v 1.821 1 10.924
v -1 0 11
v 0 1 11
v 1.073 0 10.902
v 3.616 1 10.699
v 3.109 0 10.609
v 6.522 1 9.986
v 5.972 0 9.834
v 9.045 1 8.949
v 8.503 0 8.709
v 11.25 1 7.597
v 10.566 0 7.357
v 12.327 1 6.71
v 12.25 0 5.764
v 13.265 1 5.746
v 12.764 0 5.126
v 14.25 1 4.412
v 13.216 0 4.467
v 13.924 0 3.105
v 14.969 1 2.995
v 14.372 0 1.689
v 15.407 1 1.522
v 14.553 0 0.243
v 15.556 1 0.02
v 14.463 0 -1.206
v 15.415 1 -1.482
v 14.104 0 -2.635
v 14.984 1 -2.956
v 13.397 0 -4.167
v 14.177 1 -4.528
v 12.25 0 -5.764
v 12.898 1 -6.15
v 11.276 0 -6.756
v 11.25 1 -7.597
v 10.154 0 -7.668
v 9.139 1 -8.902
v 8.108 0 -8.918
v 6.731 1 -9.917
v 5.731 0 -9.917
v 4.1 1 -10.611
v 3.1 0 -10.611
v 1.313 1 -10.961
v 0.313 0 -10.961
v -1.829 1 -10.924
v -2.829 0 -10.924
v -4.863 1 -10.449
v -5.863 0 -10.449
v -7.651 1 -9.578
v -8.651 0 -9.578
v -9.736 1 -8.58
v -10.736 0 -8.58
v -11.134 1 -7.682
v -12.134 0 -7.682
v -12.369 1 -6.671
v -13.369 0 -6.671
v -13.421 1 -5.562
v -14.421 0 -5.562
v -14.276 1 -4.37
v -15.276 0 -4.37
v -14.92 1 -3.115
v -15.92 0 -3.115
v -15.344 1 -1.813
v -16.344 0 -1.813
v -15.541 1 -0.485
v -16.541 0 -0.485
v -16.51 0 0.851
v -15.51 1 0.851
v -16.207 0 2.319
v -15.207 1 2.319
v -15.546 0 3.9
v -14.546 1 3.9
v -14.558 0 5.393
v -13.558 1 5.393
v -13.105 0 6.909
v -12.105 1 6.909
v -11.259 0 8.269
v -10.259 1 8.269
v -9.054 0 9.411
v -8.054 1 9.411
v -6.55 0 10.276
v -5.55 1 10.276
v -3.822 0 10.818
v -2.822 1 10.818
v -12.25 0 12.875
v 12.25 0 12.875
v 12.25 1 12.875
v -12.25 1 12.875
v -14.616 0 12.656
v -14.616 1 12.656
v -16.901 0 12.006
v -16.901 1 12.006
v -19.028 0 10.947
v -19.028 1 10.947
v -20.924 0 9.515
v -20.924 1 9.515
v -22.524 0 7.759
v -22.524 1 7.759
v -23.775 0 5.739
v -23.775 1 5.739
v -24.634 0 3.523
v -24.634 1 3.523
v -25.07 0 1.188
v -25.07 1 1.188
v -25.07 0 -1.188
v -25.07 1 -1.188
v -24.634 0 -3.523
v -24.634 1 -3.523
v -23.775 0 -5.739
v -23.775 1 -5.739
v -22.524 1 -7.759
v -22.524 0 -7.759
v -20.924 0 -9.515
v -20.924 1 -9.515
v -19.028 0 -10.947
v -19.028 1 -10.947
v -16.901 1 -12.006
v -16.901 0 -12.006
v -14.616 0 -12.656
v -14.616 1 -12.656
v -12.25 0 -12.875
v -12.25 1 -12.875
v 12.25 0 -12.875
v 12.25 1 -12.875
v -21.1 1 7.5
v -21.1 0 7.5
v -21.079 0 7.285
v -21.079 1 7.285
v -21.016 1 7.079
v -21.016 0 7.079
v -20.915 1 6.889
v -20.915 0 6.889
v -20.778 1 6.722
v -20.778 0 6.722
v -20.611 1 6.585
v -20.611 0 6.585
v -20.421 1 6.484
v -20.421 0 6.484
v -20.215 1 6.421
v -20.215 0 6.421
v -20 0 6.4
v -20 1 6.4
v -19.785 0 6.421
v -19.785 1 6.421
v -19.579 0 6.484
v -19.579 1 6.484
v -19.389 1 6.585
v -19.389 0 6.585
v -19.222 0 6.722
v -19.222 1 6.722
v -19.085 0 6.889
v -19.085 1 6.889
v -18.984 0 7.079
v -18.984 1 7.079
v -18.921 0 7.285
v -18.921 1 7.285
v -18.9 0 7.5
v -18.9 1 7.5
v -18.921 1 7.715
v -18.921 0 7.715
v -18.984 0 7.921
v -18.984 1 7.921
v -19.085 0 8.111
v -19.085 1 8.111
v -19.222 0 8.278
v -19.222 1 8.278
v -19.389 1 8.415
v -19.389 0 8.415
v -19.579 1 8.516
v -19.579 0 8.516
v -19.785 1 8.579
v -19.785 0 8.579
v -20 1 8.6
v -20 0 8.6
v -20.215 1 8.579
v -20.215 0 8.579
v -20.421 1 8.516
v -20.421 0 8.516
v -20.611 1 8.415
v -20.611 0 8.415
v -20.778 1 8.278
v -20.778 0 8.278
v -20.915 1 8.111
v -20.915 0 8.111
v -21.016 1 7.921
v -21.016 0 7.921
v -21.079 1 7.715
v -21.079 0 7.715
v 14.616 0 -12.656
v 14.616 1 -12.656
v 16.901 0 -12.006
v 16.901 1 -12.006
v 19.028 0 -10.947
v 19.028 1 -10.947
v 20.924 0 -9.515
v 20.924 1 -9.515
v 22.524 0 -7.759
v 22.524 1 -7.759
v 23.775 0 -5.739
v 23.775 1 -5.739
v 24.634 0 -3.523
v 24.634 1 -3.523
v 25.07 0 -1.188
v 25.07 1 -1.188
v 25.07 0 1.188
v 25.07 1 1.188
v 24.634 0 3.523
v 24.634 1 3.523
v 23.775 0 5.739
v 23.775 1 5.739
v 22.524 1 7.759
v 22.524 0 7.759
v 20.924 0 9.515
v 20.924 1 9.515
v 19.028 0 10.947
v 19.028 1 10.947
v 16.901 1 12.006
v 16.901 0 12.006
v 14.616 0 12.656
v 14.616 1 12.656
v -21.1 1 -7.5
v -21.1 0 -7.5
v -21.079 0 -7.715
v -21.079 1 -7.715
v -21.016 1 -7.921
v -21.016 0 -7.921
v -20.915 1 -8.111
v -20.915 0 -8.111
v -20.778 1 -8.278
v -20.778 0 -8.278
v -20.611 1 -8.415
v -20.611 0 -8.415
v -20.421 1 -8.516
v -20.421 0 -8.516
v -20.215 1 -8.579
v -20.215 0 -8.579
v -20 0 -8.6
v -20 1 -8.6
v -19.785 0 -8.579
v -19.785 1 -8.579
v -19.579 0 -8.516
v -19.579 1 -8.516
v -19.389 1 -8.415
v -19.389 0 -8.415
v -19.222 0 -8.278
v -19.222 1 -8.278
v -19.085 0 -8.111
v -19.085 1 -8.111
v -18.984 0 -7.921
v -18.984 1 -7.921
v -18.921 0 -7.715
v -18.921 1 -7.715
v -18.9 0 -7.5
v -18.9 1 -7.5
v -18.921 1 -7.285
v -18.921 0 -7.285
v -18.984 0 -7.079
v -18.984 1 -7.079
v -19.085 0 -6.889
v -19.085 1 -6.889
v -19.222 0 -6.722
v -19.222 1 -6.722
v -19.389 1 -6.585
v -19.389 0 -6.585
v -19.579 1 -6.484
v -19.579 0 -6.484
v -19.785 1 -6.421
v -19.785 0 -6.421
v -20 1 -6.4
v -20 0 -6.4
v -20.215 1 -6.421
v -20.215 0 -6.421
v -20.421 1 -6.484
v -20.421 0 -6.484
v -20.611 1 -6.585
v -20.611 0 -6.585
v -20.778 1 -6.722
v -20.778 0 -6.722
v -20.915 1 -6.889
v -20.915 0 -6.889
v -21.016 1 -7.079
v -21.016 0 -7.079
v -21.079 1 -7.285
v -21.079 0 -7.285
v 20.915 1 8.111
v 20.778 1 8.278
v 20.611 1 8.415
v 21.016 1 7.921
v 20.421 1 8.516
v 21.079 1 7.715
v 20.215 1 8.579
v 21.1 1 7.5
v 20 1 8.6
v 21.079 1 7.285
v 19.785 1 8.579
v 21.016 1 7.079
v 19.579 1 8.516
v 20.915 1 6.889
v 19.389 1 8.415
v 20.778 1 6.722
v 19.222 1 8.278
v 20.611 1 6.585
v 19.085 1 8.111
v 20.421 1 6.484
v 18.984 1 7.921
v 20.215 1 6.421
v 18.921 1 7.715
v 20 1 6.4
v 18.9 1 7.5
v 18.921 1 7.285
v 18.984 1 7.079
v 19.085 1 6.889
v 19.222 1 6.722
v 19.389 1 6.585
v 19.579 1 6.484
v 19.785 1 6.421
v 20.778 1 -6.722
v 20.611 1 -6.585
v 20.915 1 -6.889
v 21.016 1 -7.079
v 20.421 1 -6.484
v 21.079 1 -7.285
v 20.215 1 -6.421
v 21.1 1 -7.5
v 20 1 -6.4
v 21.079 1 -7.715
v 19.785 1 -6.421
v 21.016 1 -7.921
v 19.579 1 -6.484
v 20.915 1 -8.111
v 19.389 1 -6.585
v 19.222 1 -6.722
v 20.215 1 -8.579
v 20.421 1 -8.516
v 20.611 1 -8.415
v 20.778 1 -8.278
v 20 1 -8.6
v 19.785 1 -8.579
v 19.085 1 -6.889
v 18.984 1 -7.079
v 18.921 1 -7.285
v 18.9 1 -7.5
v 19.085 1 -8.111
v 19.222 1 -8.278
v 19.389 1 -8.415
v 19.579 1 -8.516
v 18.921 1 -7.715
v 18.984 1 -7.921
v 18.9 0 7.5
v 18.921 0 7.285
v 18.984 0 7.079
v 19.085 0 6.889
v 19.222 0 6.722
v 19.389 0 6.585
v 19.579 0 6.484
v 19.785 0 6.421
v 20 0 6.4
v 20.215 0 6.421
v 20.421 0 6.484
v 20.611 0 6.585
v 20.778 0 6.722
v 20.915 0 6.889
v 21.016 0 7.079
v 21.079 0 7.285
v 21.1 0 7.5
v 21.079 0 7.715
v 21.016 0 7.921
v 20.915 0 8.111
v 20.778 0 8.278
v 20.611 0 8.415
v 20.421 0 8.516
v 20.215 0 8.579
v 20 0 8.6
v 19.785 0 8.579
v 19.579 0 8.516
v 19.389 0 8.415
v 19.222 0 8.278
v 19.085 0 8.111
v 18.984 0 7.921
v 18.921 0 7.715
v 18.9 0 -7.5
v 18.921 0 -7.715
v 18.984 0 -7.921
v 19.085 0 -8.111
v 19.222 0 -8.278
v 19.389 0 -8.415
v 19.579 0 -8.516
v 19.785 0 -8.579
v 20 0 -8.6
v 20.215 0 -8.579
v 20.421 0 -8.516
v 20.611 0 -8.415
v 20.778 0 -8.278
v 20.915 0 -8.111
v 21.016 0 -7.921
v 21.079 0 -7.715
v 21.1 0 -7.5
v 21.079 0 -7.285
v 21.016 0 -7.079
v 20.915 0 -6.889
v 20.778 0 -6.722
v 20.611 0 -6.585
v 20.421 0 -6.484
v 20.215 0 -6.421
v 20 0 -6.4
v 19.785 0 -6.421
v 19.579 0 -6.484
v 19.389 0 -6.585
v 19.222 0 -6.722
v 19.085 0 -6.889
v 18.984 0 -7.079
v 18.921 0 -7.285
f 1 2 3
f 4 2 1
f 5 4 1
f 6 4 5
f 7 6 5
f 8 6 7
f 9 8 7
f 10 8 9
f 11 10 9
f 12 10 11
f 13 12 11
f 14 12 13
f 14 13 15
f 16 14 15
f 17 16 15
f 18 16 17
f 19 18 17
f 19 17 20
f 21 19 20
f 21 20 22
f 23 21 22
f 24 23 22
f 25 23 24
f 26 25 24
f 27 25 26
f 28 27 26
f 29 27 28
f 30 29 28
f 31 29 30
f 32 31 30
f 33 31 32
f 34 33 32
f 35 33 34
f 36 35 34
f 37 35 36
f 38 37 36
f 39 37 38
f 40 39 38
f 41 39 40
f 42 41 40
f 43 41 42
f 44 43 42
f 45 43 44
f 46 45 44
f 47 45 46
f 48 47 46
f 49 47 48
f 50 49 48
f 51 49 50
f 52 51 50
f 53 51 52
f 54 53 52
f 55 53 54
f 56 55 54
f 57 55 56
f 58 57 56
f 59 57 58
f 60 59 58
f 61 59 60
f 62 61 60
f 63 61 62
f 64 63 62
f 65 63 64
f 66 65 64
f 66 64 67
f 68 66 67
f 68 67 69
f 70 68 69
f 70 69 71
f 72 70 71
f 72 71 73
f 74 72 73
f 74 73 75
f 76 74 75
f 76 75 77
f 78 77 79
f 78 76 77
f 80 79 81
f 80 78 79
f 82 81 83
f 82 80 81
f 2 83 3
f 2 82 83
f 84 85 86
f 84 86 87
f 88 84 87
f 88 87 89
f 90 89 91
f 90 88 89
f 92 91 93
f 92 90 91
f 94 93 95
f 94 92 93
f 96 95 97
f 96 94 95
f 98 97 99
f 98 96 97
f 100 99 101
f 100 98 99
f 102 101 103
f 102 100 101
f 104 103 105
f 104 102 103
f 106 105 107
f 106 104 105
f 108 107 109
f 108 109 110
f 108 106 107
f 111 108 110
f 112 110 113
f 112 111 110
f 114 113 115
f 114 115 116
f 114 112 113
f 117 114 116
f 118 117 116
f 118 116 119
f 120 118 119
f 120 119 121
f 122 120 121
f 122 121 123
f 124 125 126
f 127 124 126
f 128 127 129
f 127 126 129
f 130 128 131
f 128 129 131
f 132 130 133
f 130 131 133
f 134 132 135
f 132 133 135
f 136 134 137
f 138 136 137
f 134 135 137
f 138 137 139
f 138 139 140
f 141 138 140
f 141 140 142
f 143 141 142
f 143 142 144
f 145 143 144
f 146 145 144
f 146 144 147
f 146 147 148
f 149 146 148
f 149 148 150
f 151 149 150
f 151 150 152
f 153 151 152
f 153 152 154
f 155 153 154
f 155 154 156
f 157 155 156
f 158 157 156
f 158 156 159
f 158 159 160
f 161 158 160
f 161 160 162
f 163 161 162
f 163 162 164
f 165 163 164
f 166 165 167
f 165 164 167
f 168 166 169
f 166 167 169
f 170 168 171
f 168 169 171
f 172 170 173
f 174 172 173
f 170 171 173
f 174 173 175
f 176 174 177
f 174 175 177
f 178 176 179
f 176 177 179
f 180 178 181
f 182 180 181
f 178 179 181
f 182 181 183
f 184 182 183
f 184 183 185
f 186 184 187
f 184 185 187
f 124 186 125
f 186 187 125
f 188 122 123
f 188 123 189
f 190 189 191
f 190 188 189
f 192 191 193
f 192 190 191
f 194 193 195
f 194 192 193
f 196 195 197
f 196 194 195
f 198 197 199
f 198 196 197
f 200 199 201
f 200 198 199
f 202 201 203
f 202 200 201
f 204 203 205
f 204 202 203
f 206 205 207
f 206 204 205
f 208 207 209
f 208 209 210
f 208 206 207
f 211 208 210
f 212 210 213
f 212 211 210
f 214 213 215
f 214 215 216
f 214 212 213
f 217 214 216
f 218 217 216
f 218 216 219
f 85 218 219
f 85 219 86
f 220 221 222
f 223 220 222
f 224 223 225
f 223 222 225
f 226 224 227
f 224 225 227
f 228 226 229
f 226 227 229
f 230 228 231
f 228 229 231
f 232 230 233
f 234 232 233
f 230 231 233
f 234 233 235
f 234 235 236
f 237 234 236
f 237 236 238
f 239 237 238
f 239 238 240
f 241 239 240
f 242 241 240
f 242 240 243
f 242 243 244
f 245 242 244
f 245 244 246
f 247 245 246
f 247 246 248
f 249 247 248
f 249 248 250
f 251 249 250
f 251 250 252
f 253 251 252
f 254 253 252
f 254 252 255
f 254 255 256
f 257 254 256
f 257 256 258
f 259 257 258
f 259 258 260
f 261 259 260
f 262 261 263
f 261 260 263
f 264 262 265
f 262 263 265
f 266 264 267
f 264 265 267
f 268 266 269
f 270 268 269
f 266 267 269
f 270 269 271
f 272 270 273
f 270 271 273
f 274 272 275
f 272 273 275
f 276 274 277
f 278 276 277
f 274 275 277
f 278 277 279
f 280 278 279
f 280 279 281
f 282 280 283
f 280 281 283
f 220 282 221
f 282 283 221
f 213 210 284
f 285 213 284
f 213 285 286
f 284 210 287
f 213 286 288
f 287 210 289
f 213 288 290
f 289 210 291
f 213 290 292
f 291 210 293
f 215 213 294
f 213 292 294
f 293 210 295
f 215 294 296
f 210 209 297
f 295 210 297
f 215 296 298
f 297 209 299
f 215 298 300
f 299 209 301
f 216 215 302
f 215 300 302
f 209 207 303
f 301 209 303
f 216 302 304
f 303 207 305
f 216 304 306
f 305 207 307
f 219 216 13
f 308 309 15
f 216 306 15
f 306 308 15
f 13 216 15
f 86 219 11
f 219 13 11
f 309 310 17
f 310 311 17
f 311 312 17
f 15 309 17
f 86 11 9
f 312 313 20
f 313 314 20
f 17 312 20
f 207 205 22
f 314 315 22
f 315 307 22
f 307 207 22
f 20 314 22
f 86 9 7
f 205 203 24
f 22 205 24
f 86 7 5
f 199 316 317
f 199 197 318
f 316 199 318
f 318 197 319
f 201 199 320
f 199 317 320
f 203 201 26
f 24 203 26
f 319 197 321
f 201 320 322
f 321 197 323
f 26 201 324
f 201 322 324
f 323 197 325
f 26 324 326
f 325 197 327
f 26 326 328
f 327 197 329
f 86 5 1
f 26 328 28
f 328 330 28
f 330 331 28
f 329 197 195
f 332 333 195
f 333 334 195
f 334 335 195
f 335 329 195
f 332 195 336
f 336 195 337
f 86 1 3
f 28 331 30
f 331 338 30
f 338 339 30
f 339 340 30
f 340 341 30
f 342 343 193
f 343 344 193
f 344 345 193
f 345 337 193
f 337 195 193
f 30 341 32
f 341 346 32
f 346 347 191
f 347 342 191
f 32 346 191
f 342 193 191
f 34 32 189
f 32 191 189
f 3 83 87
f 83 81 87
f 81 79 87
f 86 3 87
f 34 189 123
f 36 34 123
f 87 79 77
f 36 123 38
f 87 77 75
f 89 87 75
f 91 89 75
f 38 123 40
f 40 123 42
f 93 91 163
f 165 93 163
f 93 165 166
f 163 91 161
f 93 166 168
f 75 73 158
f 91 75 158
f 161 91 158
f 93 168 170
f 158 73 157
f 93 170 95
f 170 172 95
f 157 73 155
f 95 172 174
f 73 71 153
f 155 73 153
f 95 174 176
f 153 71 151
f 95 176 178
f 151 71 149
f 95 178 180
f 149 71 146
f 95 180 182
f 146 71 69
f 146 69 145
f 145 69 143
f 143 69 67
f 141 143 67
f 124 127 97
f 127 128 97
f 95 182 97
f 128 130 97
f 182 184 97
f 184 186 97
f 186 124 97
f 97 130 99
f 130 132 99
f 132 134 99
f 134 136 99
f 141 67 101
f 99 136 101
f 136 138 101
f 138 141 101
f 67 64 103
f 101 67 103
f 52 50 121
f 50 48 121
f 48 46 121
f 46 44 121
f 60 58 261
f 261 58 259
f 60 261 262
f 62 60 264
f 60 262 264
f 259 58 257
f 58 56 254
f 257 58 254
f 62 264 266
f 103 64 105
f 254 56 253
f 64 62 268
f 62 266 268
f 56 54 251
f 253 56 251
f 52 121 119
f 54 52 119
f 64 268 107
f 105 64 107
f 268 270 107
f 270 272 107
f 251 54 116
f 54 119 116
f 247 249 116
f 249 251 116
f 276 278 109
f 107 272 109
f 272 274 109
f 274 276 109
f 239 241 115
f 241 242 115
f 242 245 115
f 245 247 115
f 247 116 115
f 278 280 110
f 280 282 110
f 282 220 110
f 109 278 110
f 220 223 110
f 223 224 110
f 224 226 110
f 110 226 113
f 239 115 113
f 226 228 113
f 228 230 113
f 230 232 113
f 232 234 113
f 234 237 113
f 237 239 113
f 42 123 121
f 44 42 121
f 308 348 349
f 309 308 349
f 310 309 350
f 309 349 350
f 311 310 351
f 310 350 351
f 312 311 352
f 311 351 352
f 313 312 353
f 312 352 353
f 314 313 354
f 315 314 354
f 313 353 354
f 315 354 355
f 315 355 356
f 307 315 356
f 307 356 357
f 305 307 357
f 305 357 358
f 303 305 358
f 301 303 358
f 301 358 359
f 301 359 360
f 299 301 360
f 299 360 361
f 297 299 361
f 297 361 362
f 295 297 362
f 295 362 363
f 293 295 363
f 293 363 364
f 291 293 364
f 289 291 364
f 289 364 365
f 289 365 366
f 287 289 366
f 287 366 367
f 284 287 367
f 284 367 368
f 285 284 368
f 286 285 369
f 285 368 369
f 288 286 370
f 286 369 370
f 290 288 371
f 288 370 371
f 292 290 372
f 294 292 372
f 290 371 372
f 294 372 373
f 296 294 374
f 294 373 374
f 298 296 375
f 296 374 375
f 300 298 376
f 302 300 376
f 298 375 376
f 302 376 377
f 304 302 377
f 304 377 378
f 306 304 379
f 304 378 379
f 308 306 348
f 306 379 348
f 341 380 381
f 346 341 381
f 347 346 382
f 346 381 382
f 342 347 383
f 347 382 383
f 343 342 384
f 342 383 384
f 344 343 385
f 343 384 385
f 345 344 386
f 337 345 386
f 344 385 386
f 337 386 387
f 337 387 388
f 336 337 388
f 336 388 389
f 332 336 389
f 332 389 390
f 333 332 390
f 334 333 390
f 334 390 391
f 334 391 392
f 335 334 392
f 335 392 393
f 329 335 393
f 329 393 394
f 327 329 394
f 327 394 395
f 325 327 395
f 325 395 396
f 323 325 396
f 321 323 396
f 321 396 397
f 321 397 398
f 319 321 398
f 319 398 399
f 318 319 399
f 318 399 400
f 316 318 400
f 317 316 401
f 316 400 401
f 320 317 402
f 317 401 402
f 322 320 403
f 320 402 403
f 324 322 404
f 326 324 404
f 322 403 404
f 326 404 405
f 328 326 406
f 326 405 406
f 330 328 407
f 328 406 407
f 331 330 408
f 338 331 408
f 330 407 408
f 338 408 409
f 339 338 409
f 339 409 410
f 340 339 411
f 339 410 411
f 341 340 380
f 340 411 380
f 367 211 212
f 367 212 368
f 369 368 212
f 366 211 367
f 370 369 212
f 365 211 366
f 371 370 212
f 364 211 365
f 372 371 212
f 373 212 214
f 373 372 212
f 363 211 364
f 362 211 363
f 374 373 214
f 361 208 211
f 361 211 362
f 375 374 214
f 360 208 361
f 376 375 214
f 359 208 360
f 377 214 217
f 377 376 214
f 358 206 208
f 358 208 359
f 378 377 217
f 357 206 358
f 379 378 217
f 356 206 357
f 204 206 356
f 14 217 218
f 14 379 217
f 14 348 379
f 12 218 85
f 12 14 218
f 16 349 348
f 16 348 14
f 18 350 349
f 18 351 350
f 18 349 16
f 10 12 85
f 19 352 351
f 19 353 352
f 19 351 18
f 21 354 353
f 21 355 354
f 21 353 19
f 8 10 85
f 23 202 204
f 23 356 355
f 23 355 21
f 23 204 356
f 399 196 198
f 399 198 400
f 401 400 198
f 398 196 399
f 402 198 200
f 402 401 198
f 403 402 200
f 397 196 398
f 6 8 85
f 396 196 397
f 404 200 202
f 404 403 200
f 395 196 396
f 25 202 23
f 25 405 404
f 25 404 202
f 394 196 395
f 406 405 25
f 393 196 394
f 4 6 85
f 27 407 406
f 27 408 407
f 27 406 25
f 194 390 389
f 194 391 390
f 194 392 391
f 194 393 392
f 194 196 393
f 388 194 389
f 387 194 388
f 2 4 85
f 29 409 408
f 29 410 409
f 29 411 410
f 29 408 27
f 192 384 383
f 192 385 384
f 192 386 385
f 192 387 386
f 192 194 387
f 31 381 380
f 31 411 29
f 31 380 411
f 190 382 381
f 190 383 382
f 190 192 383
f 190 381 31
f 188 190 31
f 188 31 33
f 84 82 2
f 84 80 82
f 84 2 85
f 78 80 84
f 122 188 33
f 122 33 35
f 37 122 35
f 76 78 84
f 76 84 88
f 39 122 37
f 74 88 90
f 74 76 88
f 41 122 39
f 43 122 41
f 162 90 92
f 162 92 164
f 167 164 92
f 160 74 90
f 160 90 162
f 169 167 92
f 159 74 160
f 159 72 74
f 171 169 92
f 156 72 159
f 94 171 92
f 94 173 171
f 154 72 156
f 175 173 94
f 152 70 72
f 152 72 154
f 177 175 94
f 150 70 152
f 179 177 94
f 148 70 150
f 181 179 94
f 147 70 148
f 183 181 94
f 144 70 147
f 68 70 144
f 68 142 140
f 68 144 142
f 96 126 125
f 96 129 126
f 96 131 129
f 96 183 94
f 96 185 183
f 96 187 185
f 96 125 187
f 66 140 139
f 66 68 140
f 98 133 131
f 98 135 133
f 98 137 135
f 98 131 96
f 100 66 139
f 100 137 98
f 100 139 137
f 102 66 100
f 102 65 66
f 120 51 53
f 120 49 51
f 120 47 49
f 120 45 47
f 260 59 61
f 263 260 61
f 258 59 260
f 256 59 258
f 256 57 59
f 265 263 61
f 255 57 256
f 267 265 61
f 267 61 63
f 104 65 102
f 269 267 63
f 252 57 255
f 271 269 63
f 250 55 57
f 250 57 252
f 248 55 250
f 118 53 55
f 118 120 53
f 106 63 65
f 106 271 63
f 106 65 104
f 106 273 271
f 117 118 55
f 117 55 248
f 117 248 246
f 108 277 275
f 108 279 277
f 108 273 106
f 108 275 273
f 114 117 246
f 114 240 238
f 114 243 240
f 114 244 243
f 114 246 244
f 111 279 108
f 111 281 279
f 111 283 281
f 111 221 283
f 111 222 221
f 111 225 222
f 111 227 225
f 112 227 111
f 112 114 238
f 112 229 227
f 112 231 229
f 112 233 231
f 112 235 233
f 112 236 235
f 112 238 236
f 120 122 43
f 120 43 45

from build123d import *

# Parameters (mm, degrees)
BOSS_EXTRUDE1_DEPTH      = 1
SKETCH2_R                = 11
CUT_EXTRUDE1_DEPTH       = 10.811106589
CUT_EXTRUDE1_DEPTH_BACK  = 27.428115947
M2_CLEARANCE_HOLE1_D     = 2.2
M2_CLEARANCE_HOLE1_DEPTH = 1


with BuildPart() as part:
    # Sketch1 → Boss-Extrude1 (new body)
    with BuildSketch(Plane(origin=(0, 0, 0), x_dir=(1, 0, 0), z_dir=(0, 1, 0))):
        with BuildLine():
            Line((-12.25, 12.875), (12.25, 12.875))
            ThreePointArc((12.25, 12.875), (25.125, 0), (12.25, -12.875))
            Line((12.25, -12.875), (-12.25, -12.875))
            ThreePointArc((-12.25, -12.875), (-25.125, 0), (-12.25, 12.875))
        make_face()
    extrude(amount=BOSS_EXTRUDE1_DEPTH)

    # Sketch2 → Cut-Extrude1 (cut, two sides)
    with BuildSketch(Plane(origin=(6.125, 6.125, 0), x_dir=(0, 0, 1), z_dir=(0.707106781, 0.707106781, 0))) as cut_extrude1_sk:
        with Locations((0, -0.707106781)):
            Circle(SKETCH2_R)
    extrude(amount=CUT_EXTRUDE1_DEPTH, mode=Mode.SUBTRACT)
    extrude(cut_extrude1_sk.sketch, amount=-CUT_EXTRUDE1_DEPTH_BACK, mode=Mode.SUBTRACT)

    # M2 Clearance Hole1
    with Locations(Plane(origin=(0, 1, 0), x_dir=(1, 0, 0), z_dir=(0, 1, 0))):
        with Locations((-20, 7.5), (-20, -7.5), (20, -7.5), (20, 7.5)):
            Hole(M2_CLEARANCE_HOLE1_D / 2, depth=M2_CLEARANCE_HOLE1_DEPTH)


solid = part.part
